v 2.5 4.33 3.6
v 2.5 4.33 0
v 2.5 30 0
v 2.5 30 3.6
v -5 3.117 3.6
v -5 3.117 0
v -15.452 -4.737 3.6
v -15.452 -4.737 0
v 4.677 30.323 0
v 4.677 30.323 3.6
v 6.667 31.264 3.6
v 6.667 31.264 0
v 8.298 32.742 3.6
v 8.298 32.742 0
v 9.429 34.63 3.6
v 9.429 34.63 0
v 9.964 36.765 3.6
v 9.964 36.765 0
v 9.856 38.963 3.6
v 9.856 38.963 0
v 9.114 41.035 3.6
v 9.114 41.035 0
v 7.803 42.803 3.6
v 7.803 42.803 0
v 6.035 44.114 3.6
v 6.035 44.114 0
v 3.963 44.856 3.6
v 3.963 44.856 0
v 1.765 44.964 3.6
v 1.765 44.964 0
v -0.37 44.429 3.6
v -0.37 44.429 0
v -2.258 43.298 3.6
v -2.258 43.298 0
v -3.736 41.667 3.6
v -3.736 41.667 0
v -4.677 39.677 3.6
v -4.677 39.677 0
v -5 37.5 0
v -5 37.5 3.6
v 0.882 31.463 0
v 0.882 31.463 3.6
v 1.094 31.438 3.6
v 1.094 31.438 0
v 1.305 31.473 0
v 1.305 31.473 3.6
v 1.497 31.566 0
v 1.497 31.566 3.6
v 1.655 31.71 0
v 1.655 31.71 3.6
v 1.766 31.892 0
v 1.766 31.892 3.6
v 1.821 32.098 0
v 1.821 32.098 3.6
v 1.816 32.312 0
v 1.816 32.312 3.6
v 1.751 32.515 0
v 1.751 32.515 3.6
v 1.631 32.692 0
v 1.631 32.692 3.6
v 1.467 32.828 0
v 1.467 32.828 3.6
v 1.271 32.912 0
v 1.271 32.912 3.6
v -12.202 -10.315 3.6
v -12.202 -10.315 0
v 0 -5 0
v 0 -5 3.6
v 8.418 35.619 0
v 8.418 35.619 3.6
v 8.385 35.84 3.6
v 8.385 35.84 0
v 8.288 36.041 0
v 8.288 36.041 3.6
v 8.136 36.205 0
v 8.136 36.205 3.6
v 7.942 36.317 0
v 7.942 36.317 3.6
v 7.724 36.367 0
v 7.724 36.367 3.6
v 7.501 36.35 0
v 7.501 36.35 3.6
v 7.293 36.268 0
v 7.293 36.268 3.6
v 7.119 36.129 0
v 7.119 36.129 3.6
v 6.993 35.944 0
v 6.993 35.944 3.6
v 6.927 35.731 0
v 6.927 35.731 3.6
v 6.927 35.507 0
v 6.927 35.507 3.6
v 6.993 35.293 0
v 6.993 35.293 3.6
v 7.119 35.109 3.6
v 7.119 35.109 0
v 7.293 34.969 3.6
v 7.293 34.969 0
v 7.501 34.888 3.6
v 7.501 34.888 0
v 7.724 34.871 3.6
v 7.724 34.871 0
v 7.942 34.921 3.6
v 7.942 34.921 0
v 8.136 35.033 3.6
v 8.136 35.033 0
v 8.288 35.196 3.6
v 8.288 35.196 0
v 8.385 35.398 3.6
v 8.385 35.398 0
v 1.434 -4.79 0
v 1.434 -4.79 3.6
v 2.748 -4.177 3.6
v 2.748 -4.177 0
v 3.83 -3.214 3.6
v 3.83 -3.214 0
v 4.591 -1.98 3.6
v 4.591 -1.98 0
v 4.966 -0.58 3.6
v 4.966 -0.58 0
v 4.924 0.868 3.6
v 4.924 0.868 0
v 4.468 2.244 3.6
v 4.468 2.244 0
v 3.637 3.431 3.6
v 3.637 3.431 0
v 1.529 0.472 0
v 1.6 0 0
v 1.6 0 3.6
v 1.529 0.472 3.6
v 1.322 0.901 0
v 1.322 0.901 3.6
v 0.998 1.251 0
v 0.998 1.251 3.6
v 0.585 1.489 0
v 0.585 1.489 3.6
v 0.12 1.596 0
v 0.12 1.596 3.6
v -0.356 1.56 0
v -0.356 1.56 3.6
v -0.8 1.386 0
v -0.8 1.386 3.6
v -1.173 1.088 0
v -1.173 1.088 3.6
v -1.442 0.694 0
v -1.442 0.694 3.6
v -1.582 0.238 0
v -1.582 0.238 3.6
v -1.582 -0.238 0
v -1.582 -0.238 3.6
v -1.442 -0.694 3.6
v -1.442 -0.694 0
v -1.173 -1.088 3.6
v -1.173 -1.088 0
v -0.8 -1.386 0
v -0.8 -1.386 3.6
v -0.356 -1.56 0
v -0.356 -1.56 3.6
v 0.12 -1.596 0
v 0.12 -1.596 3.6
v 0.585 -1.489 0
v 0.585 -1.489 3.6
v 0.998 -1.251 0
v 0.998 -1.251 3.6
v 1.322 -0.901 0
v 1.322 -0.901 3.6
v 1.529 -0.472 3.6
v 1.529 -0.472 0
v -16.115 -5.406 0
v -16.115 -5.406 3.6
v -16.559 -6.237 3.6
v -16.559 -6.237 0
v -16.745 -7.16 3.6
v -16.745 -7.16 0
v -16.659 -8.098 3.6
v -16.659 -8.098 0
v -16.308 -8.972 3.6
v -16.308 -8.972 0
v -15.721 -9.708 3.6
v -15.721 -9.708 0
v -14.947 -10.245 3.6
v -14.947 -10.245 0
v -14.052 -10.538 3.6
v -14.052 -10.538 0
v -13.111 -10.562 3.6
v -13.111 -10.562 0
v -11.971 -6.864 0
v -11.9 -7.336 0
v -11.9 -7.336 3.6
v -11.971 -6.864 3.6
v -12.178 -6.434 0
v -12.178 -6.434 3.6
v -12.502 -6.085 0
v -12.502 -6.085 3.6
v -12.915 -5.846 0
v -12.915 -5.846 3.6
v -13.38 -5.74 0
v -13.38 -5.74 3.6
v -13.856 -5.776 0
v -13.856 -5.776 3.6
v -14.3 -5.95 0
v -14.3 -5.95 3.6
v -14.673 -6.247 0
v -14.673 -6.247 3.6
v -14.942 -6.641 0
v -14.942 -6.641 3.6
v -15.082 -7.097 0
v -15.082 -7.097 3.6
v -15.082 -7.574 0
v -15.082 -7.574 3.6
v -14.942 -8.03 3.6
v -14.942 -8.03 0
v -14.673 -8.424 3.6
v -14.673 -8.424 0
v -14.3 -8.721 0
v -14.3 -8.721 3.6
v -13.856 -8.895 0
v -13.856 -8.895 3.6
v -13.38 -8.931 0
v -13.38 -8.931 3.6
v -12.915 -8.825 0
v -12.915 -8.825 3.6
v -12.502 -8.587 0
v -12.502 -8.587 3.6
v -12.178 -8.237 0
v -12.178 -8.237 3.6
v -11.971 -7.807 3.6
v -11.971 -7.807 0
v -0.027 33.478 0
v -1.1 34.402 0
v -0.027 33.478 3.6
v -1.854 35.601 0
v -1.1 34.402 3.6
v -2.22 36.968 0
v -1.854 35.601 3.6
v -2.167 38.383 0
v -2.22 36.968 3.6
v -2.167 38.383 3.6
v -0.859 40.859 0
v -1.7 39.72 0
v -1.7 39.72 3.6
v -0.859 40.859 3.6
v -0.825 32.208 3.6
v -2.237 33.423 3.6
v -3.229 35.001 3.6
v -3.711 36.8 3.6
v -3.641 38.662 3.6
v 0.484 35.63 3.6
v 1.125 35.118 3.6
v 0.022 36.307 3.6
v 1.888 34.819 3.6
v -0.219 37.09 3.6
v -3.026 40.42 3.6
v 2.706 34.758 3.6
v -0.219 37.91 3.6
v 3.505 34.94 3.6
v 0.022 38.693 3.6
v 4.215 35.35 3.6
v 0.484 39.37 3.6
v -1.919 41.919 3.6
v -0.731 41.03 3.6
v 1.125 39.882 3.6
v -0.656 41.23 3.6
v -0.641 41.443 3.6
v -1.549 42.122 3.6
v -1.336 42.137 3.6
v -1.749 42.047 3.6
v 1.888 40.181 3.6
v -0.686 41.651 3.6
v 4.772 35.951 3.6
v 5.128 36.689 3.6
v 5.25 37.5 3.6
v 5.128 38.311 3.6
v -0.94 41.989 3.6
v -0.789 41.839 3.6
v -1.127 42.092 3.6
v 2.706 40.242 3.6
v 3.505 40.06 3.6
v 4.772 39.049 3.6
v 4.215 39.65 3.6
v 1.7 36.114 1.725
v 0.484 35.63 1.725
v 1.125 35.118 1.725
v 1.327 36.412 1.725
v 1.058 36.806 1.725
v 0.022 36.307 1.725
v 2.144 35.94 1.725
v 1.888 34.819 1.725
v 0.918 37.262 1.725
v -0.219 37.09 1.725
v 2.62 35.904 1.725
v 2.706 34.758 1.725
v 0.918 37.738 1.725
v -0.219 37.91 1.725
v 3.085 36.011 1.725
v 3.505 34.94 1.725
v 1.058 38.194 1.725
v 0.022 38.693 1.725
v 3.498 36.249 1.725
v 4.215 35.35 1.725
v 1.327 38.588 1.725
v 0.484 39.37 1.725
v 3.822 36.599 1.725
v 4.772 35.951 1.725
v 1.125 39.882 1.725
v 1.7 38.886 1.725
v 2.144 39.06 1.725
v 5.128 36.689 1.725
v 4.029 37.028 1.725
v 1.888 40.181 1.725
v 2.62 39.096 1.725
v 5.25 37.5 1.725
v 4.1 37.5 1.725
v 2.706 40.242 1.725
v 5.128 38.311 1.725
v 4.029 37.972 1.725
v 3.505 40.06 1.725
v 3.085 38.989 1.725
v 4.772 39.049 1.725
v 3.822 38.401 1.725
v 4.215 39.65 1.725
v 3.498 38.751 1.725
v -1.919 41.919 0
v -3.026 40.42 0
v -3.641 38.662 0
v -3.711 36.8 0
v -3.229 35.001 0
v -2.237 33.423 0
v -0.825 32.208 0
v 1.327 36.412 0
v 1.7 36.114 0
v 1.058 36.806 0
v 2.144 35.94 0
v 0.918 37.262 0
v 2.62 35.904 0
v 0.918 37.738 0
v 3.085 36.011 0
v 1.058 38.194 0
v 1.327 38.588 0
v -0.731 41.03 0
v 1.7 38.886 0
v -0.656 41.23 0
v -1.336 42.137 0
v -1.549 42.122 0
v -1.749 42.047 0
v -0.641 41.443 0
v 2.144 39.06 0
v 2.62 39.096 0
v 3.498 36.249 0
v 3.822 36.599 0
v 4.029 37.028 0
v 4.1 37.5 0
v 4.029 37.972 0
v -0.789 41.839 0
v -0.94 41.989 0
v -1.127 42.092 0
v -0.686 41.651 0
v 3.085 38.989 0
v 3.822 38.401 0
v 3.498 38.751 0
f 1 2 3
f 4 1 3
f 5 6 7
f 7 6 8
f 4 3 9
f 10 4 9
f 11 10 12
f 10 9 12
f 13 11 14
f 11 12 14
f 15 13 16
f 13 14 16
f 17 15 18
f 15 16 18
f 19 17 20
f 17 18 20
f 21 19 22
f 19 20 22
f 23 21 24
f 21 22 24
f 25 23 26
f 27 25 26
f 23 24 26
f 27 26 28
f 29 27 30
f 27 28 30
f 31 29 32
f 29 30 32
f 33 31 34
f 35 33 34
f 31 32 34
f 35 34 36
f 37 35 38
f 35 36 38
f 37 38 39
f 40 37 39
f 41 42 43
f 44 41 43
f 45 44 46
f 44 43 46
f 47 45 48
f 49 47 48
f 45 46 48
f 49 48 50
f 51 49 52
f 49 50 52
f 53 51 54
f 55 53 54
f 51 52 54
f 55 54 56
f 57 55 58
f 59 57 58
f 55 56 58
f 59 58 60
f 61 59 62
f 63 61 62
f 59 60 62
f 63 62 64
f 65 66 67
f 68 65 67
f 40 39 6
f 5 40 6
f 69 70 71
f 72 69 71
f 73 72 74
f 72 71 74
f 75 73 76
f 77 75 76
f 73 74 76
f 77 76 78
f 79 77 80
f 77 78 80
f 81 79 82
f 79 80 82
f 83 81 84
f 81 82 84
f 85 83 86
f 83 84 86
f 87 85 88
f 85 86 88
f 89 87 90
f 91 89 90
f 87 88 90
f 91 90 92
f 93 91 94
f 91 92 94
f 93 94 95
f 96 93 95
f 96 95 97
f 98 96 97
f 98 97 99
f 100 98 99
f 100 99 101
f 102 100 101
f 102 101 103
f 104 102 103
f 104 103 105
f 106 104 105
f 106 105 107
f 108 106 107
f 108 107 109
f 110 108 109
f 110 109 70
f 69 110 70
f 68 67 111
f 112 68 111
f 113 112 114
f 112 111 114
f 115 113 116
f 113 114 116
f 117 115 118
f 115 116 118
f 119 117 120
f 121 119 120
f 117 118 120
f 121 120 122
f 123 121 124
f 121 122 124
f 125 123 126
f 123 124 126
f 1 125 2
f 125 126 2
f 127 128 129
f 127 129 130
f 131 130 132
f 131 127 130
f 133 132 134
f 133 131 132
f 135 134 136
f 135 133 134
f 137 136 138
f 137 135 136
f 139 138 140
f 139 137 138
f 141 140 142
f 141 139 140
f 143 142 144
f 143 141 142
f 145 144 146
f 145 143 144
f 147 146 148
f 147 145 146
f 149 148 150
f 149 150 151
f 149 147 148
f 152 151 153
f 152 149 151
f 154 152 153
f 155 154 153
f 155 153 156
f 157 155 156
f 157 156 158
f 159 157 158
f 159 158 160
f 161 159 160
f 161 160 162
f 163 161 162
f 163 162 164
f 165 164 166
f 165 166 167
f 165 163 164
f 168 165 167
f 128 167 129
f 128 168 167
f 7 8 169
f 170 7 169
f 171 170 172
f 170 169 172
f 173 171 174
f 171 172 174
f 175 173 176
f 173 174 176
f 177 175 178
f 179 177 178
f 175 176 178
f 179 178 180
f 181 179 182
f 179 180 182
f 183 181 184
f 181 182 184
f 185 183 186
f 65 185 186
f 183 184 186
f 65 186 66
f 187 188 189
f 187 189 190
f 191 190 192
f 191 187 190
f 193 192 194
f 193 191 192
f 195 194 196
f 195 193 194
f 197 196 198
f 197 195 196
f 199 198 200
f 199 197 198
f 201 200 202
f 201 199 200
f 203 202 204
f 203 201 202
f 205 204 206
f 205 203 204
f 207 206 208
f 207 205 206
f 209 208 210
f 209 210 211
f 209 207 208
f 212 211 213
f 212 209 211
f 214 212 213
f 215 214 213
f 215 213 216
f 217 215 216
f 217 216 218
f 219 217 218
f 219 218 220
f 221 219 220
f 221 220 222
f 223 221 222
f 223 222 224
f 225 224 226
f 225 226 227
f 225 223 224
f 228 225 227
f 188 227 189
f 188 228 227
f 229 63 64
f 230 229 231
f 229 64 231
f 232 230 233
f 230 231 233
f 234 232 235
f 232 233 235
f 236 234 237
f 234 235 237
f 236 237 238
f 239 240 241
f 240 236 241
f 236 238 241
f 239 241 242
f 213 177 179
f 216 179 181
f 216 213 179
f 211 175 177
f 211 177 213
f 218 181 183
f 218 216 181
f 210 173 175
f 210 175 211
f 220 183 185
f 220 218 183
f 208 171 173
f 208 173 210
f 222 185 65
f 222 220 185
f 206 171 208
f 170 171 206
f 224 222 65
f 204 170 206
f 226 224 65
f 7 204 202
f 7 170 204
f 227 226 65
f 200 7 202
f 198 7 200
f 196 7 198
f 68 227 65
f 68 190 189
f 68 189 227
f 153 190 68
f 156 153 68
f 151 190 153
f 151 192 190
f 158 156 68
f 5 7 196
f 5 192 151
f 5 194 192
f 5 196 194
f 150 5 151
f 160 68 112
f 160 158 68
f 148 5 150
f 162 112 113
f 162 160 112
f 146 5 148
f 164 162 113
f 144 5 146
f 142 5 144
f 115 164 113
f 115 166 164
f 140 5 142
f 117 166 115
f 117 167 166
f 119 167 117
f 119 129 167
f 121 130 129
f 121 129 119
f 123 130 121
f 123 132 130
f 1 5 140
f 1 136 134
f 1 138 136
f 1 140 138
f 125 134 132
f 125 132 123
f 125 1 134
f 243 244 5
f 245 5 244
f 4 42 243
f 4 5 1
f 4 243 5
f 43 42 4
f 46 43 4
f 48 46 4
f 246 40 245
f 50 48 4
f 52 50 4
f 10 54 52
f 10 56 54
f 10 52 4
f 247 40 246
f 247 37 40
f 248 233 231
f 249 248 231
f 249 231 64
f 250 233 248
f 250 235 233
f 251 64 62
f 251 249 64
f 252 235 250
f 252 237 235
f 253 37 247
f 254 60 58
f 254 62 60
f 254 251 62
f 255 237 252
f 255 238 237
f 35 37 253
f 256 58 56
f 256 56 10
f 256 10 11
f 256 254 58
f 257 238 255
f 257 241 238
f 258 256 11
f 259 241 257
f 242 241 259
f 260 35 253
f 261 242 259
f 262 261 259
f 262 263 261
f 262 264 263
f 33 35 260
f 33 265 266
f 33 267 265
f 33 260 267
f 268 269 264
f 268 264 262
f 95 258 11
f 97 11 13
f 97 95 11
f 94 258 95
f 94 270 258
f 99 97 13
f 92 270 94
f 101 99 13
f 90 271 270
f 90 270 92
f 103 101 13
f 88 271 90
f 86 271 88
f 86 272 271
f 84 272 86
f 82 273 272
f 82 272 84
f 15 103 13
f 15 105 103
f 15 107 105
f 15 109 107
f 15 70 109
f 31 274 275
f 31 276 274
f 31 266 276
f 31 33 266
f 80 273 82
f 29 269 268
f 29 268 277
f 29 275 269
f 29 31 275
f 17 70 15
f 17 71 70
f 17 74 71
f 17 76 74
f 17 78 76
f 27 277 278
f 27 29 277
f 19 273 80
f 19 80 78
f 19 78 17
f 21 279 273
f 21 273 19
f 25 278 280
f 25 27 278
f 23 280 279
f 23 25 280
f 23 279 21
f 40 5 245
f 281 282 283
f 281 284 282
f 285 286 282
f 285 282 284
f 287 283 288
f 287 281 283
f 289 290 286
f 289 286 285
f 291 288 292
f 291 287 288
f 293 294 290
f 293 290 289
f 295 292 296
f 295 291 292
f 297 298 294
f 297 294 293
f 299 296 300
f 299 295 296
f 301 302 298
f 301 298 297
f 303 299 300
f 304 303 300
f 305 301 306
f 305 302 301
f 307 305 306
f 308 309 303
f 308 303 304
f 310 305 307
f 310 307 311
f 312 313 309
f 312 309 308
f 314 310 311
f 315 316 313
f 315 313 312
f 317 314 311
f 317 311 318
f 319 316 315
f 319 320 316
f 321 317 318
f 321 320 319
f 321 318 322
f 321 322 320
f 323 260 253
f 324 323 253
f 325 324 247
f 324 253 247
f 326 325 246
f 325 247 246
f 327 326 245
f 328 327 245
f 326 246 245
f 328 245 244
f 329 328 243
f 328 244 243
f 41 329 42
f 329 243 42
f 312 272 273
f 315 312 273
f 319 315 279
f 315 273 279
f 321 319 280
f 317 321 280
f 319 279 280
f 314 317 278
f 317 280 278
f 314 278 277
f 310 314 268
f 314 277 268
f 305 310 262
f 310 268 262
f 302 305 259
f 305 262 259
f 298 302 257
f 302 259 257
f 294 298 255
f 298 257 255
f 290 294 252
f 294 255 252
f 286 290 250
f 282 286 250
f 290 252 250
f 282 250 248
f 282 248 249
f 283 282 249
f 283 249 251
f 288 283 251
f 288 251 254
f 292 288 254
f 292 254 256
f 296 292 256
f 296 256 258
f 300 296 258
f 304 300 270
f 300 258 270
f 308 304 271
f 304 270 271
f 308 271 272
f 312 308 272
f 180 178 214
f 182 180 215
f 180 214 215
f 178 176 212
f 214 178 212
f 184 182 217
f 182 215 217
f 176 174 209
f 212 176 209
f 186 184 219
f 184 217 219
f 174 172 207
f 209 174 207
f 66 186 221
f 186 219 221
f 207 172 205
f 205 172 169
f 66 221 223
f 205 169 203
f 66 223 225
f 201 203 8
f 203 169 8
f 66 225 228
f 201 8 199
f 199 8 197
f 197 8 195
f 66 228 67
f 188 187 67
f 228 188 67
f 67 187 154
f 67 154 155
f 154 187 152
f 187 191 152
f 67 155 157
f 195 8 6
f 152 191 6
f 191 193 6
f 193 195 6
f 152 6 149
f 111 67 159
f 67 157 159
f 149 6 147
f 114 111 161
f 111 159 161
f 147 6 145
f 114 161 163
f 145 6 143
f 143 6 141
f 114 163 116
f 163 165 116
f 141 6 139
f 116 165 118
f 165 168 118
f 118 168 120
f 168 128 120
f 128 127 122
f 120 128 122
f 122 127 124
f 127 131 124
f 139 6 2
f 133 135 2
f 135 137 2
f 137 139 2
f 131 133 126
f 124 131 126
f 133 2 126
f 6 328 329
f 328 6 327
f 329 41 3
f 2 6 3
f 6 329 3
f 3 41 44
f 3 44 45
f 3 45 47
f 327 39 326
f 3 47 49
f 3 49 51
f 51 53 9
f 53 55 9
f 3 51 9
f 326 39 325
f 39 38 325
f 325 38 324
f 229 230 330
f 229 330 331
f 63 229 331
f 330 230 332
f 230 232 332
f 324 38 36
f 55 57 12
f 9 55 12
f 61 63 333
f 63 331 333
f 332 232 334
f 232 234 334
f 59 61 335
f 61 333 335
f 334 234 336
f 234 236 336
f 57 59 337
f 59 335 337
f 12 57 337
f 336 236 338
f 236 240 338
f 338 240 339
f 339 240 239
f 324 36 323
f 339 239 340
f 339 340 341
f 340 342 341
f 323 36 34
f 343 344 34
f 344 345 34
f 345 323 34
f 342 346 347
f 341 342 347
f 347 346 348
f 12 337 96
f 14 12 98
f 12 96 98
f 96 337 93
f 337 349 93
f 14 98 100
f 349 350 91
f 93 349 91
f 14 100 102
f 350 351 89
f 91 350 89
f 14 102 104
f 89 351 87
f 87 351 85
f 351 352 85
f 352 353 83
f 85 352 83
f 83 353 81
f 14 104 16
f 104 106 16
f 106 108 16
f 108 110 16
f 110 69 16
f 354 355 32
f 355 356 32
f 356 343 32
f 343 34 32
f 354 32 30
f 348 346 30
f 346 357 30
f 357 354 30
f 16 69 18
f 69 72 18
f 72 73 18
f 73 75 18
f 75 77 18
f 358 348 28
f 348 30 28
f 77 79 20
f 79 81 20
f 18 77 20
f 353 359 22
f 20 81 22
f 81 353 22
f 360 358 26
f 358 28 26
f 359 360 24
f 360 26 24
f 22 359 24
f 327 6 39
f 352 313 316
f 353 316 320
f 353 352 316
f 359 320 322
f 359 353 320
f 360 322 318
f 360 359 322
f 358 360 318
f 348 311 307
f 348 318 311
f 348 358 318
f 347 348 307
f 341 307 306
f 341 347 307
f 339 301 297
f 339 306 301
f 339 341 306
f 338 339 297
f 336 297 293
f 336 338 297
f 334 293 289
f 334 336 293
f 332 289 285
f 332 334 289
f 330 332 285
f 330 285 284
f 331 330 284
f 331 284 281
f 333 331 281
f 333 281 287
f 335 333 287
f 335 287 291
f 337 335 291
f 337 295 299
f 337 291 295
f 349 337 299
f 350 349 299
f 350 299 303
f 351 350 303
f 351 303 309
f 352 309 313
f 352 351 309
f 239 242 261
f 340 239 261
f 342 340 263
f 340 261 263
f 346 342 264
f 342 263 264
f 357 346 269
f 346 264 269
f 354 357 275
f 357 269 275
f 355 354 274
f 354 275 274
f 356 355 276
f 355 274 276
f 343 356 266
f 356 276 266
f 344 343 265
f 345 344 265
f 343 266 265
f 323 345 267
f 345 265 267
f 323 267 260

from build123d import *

# Parameters (mm, degrees)
SKETCH1_R           = 1.6
BOSS_EXTRUDE1_DEPTH = 3.6
SKETCH2_R           = 0.75
CUT_EXTRUDE1_DEPTH  = 4.6
SKETCH4_R           = 2.75
CUT_EXTRUDE3_DEPTH  = 1.875


with BuildPart() as part:
    # Sketch1 → Boss-Extrude1 (new body)
    with BuildSketch(Plane.XY):
        with BuildLine():
            Line((-5, 37.5), (-5, 3.117408991))
            Line((-5, 3.117408991), (-15.45246273, -4.737424277))
            ThreePointArc((-15.45246273, -4.737424277), (-16.30801025, -8.97190619), (-12.202106424, -10.31516804))
            Line((-12.202106424, -10.31516804), (0, -5))
            ThreePointArc((0, -5), (4.829629131, -1.294095226), (2.5, 4.330127019))
            Line((2.5, 4.330127019), (2.5, 30))
            ThreePointArc((2.5, 30), (7.803300859, 42.803300859), (-5, 37.5))
        make_face()
        Circle(SKETCH1_R, mode=Mode.SUBTRACT)
        with Locations((-13.5, -7.335575406)):
            Circle(SKETCH1_R, mode=Mode.SUBTRACT)
        with Locations((2.5, 37.5)):
            Circle(SKETCH1_R, mode=Mode.SUBTRACT)
    extrude(amount=BOSS_EXTRUDE1_DEPTH)

    # Sketch2 → Cut-Extrude1 (cut, through all)
    with BuildSketch(Plane.XY.offset(3.6)):
        with Locations((7.668309414, 35.618889212)):
            Circle(SKETCH2_R)
        with BuildLine():
            ThreePointArc((-0.858757211, 40.858757211), (-0.858757211, 41.919417382), (-1.919417382, 41.919417382))
            ThreePointArc((-1.919417382, 41.919417382), (-3.537036414, 35.882380968), (0.882380968, 31.462963586))
            ThreePointArc((0.882380968, 31.462963586), (1.800939622, 31.993293672), (1.270609536, 32.911852325))
            ThreePointArc((1.270609536, 32.911852325), (-2.088147675, 36.270609536), (-0.858757211, 40.858757211))
        make_face()
    extrude(amount=-CUT_EXTRUDE1_DEPTH, mode=Mode.SUBTRACT)

    # Sketch4 → Cut-Extrude3 (cut)
    with BuildSketch(Plane.XY.offset(3.6)):
        with Locations((2.5, 37.5)):
            Circle(SKETCH4_R)
    extrude(amount=-CUT_EXTRUDE3_DEPTH, mode=Mode.SUBTRACT)


solid = part.part
